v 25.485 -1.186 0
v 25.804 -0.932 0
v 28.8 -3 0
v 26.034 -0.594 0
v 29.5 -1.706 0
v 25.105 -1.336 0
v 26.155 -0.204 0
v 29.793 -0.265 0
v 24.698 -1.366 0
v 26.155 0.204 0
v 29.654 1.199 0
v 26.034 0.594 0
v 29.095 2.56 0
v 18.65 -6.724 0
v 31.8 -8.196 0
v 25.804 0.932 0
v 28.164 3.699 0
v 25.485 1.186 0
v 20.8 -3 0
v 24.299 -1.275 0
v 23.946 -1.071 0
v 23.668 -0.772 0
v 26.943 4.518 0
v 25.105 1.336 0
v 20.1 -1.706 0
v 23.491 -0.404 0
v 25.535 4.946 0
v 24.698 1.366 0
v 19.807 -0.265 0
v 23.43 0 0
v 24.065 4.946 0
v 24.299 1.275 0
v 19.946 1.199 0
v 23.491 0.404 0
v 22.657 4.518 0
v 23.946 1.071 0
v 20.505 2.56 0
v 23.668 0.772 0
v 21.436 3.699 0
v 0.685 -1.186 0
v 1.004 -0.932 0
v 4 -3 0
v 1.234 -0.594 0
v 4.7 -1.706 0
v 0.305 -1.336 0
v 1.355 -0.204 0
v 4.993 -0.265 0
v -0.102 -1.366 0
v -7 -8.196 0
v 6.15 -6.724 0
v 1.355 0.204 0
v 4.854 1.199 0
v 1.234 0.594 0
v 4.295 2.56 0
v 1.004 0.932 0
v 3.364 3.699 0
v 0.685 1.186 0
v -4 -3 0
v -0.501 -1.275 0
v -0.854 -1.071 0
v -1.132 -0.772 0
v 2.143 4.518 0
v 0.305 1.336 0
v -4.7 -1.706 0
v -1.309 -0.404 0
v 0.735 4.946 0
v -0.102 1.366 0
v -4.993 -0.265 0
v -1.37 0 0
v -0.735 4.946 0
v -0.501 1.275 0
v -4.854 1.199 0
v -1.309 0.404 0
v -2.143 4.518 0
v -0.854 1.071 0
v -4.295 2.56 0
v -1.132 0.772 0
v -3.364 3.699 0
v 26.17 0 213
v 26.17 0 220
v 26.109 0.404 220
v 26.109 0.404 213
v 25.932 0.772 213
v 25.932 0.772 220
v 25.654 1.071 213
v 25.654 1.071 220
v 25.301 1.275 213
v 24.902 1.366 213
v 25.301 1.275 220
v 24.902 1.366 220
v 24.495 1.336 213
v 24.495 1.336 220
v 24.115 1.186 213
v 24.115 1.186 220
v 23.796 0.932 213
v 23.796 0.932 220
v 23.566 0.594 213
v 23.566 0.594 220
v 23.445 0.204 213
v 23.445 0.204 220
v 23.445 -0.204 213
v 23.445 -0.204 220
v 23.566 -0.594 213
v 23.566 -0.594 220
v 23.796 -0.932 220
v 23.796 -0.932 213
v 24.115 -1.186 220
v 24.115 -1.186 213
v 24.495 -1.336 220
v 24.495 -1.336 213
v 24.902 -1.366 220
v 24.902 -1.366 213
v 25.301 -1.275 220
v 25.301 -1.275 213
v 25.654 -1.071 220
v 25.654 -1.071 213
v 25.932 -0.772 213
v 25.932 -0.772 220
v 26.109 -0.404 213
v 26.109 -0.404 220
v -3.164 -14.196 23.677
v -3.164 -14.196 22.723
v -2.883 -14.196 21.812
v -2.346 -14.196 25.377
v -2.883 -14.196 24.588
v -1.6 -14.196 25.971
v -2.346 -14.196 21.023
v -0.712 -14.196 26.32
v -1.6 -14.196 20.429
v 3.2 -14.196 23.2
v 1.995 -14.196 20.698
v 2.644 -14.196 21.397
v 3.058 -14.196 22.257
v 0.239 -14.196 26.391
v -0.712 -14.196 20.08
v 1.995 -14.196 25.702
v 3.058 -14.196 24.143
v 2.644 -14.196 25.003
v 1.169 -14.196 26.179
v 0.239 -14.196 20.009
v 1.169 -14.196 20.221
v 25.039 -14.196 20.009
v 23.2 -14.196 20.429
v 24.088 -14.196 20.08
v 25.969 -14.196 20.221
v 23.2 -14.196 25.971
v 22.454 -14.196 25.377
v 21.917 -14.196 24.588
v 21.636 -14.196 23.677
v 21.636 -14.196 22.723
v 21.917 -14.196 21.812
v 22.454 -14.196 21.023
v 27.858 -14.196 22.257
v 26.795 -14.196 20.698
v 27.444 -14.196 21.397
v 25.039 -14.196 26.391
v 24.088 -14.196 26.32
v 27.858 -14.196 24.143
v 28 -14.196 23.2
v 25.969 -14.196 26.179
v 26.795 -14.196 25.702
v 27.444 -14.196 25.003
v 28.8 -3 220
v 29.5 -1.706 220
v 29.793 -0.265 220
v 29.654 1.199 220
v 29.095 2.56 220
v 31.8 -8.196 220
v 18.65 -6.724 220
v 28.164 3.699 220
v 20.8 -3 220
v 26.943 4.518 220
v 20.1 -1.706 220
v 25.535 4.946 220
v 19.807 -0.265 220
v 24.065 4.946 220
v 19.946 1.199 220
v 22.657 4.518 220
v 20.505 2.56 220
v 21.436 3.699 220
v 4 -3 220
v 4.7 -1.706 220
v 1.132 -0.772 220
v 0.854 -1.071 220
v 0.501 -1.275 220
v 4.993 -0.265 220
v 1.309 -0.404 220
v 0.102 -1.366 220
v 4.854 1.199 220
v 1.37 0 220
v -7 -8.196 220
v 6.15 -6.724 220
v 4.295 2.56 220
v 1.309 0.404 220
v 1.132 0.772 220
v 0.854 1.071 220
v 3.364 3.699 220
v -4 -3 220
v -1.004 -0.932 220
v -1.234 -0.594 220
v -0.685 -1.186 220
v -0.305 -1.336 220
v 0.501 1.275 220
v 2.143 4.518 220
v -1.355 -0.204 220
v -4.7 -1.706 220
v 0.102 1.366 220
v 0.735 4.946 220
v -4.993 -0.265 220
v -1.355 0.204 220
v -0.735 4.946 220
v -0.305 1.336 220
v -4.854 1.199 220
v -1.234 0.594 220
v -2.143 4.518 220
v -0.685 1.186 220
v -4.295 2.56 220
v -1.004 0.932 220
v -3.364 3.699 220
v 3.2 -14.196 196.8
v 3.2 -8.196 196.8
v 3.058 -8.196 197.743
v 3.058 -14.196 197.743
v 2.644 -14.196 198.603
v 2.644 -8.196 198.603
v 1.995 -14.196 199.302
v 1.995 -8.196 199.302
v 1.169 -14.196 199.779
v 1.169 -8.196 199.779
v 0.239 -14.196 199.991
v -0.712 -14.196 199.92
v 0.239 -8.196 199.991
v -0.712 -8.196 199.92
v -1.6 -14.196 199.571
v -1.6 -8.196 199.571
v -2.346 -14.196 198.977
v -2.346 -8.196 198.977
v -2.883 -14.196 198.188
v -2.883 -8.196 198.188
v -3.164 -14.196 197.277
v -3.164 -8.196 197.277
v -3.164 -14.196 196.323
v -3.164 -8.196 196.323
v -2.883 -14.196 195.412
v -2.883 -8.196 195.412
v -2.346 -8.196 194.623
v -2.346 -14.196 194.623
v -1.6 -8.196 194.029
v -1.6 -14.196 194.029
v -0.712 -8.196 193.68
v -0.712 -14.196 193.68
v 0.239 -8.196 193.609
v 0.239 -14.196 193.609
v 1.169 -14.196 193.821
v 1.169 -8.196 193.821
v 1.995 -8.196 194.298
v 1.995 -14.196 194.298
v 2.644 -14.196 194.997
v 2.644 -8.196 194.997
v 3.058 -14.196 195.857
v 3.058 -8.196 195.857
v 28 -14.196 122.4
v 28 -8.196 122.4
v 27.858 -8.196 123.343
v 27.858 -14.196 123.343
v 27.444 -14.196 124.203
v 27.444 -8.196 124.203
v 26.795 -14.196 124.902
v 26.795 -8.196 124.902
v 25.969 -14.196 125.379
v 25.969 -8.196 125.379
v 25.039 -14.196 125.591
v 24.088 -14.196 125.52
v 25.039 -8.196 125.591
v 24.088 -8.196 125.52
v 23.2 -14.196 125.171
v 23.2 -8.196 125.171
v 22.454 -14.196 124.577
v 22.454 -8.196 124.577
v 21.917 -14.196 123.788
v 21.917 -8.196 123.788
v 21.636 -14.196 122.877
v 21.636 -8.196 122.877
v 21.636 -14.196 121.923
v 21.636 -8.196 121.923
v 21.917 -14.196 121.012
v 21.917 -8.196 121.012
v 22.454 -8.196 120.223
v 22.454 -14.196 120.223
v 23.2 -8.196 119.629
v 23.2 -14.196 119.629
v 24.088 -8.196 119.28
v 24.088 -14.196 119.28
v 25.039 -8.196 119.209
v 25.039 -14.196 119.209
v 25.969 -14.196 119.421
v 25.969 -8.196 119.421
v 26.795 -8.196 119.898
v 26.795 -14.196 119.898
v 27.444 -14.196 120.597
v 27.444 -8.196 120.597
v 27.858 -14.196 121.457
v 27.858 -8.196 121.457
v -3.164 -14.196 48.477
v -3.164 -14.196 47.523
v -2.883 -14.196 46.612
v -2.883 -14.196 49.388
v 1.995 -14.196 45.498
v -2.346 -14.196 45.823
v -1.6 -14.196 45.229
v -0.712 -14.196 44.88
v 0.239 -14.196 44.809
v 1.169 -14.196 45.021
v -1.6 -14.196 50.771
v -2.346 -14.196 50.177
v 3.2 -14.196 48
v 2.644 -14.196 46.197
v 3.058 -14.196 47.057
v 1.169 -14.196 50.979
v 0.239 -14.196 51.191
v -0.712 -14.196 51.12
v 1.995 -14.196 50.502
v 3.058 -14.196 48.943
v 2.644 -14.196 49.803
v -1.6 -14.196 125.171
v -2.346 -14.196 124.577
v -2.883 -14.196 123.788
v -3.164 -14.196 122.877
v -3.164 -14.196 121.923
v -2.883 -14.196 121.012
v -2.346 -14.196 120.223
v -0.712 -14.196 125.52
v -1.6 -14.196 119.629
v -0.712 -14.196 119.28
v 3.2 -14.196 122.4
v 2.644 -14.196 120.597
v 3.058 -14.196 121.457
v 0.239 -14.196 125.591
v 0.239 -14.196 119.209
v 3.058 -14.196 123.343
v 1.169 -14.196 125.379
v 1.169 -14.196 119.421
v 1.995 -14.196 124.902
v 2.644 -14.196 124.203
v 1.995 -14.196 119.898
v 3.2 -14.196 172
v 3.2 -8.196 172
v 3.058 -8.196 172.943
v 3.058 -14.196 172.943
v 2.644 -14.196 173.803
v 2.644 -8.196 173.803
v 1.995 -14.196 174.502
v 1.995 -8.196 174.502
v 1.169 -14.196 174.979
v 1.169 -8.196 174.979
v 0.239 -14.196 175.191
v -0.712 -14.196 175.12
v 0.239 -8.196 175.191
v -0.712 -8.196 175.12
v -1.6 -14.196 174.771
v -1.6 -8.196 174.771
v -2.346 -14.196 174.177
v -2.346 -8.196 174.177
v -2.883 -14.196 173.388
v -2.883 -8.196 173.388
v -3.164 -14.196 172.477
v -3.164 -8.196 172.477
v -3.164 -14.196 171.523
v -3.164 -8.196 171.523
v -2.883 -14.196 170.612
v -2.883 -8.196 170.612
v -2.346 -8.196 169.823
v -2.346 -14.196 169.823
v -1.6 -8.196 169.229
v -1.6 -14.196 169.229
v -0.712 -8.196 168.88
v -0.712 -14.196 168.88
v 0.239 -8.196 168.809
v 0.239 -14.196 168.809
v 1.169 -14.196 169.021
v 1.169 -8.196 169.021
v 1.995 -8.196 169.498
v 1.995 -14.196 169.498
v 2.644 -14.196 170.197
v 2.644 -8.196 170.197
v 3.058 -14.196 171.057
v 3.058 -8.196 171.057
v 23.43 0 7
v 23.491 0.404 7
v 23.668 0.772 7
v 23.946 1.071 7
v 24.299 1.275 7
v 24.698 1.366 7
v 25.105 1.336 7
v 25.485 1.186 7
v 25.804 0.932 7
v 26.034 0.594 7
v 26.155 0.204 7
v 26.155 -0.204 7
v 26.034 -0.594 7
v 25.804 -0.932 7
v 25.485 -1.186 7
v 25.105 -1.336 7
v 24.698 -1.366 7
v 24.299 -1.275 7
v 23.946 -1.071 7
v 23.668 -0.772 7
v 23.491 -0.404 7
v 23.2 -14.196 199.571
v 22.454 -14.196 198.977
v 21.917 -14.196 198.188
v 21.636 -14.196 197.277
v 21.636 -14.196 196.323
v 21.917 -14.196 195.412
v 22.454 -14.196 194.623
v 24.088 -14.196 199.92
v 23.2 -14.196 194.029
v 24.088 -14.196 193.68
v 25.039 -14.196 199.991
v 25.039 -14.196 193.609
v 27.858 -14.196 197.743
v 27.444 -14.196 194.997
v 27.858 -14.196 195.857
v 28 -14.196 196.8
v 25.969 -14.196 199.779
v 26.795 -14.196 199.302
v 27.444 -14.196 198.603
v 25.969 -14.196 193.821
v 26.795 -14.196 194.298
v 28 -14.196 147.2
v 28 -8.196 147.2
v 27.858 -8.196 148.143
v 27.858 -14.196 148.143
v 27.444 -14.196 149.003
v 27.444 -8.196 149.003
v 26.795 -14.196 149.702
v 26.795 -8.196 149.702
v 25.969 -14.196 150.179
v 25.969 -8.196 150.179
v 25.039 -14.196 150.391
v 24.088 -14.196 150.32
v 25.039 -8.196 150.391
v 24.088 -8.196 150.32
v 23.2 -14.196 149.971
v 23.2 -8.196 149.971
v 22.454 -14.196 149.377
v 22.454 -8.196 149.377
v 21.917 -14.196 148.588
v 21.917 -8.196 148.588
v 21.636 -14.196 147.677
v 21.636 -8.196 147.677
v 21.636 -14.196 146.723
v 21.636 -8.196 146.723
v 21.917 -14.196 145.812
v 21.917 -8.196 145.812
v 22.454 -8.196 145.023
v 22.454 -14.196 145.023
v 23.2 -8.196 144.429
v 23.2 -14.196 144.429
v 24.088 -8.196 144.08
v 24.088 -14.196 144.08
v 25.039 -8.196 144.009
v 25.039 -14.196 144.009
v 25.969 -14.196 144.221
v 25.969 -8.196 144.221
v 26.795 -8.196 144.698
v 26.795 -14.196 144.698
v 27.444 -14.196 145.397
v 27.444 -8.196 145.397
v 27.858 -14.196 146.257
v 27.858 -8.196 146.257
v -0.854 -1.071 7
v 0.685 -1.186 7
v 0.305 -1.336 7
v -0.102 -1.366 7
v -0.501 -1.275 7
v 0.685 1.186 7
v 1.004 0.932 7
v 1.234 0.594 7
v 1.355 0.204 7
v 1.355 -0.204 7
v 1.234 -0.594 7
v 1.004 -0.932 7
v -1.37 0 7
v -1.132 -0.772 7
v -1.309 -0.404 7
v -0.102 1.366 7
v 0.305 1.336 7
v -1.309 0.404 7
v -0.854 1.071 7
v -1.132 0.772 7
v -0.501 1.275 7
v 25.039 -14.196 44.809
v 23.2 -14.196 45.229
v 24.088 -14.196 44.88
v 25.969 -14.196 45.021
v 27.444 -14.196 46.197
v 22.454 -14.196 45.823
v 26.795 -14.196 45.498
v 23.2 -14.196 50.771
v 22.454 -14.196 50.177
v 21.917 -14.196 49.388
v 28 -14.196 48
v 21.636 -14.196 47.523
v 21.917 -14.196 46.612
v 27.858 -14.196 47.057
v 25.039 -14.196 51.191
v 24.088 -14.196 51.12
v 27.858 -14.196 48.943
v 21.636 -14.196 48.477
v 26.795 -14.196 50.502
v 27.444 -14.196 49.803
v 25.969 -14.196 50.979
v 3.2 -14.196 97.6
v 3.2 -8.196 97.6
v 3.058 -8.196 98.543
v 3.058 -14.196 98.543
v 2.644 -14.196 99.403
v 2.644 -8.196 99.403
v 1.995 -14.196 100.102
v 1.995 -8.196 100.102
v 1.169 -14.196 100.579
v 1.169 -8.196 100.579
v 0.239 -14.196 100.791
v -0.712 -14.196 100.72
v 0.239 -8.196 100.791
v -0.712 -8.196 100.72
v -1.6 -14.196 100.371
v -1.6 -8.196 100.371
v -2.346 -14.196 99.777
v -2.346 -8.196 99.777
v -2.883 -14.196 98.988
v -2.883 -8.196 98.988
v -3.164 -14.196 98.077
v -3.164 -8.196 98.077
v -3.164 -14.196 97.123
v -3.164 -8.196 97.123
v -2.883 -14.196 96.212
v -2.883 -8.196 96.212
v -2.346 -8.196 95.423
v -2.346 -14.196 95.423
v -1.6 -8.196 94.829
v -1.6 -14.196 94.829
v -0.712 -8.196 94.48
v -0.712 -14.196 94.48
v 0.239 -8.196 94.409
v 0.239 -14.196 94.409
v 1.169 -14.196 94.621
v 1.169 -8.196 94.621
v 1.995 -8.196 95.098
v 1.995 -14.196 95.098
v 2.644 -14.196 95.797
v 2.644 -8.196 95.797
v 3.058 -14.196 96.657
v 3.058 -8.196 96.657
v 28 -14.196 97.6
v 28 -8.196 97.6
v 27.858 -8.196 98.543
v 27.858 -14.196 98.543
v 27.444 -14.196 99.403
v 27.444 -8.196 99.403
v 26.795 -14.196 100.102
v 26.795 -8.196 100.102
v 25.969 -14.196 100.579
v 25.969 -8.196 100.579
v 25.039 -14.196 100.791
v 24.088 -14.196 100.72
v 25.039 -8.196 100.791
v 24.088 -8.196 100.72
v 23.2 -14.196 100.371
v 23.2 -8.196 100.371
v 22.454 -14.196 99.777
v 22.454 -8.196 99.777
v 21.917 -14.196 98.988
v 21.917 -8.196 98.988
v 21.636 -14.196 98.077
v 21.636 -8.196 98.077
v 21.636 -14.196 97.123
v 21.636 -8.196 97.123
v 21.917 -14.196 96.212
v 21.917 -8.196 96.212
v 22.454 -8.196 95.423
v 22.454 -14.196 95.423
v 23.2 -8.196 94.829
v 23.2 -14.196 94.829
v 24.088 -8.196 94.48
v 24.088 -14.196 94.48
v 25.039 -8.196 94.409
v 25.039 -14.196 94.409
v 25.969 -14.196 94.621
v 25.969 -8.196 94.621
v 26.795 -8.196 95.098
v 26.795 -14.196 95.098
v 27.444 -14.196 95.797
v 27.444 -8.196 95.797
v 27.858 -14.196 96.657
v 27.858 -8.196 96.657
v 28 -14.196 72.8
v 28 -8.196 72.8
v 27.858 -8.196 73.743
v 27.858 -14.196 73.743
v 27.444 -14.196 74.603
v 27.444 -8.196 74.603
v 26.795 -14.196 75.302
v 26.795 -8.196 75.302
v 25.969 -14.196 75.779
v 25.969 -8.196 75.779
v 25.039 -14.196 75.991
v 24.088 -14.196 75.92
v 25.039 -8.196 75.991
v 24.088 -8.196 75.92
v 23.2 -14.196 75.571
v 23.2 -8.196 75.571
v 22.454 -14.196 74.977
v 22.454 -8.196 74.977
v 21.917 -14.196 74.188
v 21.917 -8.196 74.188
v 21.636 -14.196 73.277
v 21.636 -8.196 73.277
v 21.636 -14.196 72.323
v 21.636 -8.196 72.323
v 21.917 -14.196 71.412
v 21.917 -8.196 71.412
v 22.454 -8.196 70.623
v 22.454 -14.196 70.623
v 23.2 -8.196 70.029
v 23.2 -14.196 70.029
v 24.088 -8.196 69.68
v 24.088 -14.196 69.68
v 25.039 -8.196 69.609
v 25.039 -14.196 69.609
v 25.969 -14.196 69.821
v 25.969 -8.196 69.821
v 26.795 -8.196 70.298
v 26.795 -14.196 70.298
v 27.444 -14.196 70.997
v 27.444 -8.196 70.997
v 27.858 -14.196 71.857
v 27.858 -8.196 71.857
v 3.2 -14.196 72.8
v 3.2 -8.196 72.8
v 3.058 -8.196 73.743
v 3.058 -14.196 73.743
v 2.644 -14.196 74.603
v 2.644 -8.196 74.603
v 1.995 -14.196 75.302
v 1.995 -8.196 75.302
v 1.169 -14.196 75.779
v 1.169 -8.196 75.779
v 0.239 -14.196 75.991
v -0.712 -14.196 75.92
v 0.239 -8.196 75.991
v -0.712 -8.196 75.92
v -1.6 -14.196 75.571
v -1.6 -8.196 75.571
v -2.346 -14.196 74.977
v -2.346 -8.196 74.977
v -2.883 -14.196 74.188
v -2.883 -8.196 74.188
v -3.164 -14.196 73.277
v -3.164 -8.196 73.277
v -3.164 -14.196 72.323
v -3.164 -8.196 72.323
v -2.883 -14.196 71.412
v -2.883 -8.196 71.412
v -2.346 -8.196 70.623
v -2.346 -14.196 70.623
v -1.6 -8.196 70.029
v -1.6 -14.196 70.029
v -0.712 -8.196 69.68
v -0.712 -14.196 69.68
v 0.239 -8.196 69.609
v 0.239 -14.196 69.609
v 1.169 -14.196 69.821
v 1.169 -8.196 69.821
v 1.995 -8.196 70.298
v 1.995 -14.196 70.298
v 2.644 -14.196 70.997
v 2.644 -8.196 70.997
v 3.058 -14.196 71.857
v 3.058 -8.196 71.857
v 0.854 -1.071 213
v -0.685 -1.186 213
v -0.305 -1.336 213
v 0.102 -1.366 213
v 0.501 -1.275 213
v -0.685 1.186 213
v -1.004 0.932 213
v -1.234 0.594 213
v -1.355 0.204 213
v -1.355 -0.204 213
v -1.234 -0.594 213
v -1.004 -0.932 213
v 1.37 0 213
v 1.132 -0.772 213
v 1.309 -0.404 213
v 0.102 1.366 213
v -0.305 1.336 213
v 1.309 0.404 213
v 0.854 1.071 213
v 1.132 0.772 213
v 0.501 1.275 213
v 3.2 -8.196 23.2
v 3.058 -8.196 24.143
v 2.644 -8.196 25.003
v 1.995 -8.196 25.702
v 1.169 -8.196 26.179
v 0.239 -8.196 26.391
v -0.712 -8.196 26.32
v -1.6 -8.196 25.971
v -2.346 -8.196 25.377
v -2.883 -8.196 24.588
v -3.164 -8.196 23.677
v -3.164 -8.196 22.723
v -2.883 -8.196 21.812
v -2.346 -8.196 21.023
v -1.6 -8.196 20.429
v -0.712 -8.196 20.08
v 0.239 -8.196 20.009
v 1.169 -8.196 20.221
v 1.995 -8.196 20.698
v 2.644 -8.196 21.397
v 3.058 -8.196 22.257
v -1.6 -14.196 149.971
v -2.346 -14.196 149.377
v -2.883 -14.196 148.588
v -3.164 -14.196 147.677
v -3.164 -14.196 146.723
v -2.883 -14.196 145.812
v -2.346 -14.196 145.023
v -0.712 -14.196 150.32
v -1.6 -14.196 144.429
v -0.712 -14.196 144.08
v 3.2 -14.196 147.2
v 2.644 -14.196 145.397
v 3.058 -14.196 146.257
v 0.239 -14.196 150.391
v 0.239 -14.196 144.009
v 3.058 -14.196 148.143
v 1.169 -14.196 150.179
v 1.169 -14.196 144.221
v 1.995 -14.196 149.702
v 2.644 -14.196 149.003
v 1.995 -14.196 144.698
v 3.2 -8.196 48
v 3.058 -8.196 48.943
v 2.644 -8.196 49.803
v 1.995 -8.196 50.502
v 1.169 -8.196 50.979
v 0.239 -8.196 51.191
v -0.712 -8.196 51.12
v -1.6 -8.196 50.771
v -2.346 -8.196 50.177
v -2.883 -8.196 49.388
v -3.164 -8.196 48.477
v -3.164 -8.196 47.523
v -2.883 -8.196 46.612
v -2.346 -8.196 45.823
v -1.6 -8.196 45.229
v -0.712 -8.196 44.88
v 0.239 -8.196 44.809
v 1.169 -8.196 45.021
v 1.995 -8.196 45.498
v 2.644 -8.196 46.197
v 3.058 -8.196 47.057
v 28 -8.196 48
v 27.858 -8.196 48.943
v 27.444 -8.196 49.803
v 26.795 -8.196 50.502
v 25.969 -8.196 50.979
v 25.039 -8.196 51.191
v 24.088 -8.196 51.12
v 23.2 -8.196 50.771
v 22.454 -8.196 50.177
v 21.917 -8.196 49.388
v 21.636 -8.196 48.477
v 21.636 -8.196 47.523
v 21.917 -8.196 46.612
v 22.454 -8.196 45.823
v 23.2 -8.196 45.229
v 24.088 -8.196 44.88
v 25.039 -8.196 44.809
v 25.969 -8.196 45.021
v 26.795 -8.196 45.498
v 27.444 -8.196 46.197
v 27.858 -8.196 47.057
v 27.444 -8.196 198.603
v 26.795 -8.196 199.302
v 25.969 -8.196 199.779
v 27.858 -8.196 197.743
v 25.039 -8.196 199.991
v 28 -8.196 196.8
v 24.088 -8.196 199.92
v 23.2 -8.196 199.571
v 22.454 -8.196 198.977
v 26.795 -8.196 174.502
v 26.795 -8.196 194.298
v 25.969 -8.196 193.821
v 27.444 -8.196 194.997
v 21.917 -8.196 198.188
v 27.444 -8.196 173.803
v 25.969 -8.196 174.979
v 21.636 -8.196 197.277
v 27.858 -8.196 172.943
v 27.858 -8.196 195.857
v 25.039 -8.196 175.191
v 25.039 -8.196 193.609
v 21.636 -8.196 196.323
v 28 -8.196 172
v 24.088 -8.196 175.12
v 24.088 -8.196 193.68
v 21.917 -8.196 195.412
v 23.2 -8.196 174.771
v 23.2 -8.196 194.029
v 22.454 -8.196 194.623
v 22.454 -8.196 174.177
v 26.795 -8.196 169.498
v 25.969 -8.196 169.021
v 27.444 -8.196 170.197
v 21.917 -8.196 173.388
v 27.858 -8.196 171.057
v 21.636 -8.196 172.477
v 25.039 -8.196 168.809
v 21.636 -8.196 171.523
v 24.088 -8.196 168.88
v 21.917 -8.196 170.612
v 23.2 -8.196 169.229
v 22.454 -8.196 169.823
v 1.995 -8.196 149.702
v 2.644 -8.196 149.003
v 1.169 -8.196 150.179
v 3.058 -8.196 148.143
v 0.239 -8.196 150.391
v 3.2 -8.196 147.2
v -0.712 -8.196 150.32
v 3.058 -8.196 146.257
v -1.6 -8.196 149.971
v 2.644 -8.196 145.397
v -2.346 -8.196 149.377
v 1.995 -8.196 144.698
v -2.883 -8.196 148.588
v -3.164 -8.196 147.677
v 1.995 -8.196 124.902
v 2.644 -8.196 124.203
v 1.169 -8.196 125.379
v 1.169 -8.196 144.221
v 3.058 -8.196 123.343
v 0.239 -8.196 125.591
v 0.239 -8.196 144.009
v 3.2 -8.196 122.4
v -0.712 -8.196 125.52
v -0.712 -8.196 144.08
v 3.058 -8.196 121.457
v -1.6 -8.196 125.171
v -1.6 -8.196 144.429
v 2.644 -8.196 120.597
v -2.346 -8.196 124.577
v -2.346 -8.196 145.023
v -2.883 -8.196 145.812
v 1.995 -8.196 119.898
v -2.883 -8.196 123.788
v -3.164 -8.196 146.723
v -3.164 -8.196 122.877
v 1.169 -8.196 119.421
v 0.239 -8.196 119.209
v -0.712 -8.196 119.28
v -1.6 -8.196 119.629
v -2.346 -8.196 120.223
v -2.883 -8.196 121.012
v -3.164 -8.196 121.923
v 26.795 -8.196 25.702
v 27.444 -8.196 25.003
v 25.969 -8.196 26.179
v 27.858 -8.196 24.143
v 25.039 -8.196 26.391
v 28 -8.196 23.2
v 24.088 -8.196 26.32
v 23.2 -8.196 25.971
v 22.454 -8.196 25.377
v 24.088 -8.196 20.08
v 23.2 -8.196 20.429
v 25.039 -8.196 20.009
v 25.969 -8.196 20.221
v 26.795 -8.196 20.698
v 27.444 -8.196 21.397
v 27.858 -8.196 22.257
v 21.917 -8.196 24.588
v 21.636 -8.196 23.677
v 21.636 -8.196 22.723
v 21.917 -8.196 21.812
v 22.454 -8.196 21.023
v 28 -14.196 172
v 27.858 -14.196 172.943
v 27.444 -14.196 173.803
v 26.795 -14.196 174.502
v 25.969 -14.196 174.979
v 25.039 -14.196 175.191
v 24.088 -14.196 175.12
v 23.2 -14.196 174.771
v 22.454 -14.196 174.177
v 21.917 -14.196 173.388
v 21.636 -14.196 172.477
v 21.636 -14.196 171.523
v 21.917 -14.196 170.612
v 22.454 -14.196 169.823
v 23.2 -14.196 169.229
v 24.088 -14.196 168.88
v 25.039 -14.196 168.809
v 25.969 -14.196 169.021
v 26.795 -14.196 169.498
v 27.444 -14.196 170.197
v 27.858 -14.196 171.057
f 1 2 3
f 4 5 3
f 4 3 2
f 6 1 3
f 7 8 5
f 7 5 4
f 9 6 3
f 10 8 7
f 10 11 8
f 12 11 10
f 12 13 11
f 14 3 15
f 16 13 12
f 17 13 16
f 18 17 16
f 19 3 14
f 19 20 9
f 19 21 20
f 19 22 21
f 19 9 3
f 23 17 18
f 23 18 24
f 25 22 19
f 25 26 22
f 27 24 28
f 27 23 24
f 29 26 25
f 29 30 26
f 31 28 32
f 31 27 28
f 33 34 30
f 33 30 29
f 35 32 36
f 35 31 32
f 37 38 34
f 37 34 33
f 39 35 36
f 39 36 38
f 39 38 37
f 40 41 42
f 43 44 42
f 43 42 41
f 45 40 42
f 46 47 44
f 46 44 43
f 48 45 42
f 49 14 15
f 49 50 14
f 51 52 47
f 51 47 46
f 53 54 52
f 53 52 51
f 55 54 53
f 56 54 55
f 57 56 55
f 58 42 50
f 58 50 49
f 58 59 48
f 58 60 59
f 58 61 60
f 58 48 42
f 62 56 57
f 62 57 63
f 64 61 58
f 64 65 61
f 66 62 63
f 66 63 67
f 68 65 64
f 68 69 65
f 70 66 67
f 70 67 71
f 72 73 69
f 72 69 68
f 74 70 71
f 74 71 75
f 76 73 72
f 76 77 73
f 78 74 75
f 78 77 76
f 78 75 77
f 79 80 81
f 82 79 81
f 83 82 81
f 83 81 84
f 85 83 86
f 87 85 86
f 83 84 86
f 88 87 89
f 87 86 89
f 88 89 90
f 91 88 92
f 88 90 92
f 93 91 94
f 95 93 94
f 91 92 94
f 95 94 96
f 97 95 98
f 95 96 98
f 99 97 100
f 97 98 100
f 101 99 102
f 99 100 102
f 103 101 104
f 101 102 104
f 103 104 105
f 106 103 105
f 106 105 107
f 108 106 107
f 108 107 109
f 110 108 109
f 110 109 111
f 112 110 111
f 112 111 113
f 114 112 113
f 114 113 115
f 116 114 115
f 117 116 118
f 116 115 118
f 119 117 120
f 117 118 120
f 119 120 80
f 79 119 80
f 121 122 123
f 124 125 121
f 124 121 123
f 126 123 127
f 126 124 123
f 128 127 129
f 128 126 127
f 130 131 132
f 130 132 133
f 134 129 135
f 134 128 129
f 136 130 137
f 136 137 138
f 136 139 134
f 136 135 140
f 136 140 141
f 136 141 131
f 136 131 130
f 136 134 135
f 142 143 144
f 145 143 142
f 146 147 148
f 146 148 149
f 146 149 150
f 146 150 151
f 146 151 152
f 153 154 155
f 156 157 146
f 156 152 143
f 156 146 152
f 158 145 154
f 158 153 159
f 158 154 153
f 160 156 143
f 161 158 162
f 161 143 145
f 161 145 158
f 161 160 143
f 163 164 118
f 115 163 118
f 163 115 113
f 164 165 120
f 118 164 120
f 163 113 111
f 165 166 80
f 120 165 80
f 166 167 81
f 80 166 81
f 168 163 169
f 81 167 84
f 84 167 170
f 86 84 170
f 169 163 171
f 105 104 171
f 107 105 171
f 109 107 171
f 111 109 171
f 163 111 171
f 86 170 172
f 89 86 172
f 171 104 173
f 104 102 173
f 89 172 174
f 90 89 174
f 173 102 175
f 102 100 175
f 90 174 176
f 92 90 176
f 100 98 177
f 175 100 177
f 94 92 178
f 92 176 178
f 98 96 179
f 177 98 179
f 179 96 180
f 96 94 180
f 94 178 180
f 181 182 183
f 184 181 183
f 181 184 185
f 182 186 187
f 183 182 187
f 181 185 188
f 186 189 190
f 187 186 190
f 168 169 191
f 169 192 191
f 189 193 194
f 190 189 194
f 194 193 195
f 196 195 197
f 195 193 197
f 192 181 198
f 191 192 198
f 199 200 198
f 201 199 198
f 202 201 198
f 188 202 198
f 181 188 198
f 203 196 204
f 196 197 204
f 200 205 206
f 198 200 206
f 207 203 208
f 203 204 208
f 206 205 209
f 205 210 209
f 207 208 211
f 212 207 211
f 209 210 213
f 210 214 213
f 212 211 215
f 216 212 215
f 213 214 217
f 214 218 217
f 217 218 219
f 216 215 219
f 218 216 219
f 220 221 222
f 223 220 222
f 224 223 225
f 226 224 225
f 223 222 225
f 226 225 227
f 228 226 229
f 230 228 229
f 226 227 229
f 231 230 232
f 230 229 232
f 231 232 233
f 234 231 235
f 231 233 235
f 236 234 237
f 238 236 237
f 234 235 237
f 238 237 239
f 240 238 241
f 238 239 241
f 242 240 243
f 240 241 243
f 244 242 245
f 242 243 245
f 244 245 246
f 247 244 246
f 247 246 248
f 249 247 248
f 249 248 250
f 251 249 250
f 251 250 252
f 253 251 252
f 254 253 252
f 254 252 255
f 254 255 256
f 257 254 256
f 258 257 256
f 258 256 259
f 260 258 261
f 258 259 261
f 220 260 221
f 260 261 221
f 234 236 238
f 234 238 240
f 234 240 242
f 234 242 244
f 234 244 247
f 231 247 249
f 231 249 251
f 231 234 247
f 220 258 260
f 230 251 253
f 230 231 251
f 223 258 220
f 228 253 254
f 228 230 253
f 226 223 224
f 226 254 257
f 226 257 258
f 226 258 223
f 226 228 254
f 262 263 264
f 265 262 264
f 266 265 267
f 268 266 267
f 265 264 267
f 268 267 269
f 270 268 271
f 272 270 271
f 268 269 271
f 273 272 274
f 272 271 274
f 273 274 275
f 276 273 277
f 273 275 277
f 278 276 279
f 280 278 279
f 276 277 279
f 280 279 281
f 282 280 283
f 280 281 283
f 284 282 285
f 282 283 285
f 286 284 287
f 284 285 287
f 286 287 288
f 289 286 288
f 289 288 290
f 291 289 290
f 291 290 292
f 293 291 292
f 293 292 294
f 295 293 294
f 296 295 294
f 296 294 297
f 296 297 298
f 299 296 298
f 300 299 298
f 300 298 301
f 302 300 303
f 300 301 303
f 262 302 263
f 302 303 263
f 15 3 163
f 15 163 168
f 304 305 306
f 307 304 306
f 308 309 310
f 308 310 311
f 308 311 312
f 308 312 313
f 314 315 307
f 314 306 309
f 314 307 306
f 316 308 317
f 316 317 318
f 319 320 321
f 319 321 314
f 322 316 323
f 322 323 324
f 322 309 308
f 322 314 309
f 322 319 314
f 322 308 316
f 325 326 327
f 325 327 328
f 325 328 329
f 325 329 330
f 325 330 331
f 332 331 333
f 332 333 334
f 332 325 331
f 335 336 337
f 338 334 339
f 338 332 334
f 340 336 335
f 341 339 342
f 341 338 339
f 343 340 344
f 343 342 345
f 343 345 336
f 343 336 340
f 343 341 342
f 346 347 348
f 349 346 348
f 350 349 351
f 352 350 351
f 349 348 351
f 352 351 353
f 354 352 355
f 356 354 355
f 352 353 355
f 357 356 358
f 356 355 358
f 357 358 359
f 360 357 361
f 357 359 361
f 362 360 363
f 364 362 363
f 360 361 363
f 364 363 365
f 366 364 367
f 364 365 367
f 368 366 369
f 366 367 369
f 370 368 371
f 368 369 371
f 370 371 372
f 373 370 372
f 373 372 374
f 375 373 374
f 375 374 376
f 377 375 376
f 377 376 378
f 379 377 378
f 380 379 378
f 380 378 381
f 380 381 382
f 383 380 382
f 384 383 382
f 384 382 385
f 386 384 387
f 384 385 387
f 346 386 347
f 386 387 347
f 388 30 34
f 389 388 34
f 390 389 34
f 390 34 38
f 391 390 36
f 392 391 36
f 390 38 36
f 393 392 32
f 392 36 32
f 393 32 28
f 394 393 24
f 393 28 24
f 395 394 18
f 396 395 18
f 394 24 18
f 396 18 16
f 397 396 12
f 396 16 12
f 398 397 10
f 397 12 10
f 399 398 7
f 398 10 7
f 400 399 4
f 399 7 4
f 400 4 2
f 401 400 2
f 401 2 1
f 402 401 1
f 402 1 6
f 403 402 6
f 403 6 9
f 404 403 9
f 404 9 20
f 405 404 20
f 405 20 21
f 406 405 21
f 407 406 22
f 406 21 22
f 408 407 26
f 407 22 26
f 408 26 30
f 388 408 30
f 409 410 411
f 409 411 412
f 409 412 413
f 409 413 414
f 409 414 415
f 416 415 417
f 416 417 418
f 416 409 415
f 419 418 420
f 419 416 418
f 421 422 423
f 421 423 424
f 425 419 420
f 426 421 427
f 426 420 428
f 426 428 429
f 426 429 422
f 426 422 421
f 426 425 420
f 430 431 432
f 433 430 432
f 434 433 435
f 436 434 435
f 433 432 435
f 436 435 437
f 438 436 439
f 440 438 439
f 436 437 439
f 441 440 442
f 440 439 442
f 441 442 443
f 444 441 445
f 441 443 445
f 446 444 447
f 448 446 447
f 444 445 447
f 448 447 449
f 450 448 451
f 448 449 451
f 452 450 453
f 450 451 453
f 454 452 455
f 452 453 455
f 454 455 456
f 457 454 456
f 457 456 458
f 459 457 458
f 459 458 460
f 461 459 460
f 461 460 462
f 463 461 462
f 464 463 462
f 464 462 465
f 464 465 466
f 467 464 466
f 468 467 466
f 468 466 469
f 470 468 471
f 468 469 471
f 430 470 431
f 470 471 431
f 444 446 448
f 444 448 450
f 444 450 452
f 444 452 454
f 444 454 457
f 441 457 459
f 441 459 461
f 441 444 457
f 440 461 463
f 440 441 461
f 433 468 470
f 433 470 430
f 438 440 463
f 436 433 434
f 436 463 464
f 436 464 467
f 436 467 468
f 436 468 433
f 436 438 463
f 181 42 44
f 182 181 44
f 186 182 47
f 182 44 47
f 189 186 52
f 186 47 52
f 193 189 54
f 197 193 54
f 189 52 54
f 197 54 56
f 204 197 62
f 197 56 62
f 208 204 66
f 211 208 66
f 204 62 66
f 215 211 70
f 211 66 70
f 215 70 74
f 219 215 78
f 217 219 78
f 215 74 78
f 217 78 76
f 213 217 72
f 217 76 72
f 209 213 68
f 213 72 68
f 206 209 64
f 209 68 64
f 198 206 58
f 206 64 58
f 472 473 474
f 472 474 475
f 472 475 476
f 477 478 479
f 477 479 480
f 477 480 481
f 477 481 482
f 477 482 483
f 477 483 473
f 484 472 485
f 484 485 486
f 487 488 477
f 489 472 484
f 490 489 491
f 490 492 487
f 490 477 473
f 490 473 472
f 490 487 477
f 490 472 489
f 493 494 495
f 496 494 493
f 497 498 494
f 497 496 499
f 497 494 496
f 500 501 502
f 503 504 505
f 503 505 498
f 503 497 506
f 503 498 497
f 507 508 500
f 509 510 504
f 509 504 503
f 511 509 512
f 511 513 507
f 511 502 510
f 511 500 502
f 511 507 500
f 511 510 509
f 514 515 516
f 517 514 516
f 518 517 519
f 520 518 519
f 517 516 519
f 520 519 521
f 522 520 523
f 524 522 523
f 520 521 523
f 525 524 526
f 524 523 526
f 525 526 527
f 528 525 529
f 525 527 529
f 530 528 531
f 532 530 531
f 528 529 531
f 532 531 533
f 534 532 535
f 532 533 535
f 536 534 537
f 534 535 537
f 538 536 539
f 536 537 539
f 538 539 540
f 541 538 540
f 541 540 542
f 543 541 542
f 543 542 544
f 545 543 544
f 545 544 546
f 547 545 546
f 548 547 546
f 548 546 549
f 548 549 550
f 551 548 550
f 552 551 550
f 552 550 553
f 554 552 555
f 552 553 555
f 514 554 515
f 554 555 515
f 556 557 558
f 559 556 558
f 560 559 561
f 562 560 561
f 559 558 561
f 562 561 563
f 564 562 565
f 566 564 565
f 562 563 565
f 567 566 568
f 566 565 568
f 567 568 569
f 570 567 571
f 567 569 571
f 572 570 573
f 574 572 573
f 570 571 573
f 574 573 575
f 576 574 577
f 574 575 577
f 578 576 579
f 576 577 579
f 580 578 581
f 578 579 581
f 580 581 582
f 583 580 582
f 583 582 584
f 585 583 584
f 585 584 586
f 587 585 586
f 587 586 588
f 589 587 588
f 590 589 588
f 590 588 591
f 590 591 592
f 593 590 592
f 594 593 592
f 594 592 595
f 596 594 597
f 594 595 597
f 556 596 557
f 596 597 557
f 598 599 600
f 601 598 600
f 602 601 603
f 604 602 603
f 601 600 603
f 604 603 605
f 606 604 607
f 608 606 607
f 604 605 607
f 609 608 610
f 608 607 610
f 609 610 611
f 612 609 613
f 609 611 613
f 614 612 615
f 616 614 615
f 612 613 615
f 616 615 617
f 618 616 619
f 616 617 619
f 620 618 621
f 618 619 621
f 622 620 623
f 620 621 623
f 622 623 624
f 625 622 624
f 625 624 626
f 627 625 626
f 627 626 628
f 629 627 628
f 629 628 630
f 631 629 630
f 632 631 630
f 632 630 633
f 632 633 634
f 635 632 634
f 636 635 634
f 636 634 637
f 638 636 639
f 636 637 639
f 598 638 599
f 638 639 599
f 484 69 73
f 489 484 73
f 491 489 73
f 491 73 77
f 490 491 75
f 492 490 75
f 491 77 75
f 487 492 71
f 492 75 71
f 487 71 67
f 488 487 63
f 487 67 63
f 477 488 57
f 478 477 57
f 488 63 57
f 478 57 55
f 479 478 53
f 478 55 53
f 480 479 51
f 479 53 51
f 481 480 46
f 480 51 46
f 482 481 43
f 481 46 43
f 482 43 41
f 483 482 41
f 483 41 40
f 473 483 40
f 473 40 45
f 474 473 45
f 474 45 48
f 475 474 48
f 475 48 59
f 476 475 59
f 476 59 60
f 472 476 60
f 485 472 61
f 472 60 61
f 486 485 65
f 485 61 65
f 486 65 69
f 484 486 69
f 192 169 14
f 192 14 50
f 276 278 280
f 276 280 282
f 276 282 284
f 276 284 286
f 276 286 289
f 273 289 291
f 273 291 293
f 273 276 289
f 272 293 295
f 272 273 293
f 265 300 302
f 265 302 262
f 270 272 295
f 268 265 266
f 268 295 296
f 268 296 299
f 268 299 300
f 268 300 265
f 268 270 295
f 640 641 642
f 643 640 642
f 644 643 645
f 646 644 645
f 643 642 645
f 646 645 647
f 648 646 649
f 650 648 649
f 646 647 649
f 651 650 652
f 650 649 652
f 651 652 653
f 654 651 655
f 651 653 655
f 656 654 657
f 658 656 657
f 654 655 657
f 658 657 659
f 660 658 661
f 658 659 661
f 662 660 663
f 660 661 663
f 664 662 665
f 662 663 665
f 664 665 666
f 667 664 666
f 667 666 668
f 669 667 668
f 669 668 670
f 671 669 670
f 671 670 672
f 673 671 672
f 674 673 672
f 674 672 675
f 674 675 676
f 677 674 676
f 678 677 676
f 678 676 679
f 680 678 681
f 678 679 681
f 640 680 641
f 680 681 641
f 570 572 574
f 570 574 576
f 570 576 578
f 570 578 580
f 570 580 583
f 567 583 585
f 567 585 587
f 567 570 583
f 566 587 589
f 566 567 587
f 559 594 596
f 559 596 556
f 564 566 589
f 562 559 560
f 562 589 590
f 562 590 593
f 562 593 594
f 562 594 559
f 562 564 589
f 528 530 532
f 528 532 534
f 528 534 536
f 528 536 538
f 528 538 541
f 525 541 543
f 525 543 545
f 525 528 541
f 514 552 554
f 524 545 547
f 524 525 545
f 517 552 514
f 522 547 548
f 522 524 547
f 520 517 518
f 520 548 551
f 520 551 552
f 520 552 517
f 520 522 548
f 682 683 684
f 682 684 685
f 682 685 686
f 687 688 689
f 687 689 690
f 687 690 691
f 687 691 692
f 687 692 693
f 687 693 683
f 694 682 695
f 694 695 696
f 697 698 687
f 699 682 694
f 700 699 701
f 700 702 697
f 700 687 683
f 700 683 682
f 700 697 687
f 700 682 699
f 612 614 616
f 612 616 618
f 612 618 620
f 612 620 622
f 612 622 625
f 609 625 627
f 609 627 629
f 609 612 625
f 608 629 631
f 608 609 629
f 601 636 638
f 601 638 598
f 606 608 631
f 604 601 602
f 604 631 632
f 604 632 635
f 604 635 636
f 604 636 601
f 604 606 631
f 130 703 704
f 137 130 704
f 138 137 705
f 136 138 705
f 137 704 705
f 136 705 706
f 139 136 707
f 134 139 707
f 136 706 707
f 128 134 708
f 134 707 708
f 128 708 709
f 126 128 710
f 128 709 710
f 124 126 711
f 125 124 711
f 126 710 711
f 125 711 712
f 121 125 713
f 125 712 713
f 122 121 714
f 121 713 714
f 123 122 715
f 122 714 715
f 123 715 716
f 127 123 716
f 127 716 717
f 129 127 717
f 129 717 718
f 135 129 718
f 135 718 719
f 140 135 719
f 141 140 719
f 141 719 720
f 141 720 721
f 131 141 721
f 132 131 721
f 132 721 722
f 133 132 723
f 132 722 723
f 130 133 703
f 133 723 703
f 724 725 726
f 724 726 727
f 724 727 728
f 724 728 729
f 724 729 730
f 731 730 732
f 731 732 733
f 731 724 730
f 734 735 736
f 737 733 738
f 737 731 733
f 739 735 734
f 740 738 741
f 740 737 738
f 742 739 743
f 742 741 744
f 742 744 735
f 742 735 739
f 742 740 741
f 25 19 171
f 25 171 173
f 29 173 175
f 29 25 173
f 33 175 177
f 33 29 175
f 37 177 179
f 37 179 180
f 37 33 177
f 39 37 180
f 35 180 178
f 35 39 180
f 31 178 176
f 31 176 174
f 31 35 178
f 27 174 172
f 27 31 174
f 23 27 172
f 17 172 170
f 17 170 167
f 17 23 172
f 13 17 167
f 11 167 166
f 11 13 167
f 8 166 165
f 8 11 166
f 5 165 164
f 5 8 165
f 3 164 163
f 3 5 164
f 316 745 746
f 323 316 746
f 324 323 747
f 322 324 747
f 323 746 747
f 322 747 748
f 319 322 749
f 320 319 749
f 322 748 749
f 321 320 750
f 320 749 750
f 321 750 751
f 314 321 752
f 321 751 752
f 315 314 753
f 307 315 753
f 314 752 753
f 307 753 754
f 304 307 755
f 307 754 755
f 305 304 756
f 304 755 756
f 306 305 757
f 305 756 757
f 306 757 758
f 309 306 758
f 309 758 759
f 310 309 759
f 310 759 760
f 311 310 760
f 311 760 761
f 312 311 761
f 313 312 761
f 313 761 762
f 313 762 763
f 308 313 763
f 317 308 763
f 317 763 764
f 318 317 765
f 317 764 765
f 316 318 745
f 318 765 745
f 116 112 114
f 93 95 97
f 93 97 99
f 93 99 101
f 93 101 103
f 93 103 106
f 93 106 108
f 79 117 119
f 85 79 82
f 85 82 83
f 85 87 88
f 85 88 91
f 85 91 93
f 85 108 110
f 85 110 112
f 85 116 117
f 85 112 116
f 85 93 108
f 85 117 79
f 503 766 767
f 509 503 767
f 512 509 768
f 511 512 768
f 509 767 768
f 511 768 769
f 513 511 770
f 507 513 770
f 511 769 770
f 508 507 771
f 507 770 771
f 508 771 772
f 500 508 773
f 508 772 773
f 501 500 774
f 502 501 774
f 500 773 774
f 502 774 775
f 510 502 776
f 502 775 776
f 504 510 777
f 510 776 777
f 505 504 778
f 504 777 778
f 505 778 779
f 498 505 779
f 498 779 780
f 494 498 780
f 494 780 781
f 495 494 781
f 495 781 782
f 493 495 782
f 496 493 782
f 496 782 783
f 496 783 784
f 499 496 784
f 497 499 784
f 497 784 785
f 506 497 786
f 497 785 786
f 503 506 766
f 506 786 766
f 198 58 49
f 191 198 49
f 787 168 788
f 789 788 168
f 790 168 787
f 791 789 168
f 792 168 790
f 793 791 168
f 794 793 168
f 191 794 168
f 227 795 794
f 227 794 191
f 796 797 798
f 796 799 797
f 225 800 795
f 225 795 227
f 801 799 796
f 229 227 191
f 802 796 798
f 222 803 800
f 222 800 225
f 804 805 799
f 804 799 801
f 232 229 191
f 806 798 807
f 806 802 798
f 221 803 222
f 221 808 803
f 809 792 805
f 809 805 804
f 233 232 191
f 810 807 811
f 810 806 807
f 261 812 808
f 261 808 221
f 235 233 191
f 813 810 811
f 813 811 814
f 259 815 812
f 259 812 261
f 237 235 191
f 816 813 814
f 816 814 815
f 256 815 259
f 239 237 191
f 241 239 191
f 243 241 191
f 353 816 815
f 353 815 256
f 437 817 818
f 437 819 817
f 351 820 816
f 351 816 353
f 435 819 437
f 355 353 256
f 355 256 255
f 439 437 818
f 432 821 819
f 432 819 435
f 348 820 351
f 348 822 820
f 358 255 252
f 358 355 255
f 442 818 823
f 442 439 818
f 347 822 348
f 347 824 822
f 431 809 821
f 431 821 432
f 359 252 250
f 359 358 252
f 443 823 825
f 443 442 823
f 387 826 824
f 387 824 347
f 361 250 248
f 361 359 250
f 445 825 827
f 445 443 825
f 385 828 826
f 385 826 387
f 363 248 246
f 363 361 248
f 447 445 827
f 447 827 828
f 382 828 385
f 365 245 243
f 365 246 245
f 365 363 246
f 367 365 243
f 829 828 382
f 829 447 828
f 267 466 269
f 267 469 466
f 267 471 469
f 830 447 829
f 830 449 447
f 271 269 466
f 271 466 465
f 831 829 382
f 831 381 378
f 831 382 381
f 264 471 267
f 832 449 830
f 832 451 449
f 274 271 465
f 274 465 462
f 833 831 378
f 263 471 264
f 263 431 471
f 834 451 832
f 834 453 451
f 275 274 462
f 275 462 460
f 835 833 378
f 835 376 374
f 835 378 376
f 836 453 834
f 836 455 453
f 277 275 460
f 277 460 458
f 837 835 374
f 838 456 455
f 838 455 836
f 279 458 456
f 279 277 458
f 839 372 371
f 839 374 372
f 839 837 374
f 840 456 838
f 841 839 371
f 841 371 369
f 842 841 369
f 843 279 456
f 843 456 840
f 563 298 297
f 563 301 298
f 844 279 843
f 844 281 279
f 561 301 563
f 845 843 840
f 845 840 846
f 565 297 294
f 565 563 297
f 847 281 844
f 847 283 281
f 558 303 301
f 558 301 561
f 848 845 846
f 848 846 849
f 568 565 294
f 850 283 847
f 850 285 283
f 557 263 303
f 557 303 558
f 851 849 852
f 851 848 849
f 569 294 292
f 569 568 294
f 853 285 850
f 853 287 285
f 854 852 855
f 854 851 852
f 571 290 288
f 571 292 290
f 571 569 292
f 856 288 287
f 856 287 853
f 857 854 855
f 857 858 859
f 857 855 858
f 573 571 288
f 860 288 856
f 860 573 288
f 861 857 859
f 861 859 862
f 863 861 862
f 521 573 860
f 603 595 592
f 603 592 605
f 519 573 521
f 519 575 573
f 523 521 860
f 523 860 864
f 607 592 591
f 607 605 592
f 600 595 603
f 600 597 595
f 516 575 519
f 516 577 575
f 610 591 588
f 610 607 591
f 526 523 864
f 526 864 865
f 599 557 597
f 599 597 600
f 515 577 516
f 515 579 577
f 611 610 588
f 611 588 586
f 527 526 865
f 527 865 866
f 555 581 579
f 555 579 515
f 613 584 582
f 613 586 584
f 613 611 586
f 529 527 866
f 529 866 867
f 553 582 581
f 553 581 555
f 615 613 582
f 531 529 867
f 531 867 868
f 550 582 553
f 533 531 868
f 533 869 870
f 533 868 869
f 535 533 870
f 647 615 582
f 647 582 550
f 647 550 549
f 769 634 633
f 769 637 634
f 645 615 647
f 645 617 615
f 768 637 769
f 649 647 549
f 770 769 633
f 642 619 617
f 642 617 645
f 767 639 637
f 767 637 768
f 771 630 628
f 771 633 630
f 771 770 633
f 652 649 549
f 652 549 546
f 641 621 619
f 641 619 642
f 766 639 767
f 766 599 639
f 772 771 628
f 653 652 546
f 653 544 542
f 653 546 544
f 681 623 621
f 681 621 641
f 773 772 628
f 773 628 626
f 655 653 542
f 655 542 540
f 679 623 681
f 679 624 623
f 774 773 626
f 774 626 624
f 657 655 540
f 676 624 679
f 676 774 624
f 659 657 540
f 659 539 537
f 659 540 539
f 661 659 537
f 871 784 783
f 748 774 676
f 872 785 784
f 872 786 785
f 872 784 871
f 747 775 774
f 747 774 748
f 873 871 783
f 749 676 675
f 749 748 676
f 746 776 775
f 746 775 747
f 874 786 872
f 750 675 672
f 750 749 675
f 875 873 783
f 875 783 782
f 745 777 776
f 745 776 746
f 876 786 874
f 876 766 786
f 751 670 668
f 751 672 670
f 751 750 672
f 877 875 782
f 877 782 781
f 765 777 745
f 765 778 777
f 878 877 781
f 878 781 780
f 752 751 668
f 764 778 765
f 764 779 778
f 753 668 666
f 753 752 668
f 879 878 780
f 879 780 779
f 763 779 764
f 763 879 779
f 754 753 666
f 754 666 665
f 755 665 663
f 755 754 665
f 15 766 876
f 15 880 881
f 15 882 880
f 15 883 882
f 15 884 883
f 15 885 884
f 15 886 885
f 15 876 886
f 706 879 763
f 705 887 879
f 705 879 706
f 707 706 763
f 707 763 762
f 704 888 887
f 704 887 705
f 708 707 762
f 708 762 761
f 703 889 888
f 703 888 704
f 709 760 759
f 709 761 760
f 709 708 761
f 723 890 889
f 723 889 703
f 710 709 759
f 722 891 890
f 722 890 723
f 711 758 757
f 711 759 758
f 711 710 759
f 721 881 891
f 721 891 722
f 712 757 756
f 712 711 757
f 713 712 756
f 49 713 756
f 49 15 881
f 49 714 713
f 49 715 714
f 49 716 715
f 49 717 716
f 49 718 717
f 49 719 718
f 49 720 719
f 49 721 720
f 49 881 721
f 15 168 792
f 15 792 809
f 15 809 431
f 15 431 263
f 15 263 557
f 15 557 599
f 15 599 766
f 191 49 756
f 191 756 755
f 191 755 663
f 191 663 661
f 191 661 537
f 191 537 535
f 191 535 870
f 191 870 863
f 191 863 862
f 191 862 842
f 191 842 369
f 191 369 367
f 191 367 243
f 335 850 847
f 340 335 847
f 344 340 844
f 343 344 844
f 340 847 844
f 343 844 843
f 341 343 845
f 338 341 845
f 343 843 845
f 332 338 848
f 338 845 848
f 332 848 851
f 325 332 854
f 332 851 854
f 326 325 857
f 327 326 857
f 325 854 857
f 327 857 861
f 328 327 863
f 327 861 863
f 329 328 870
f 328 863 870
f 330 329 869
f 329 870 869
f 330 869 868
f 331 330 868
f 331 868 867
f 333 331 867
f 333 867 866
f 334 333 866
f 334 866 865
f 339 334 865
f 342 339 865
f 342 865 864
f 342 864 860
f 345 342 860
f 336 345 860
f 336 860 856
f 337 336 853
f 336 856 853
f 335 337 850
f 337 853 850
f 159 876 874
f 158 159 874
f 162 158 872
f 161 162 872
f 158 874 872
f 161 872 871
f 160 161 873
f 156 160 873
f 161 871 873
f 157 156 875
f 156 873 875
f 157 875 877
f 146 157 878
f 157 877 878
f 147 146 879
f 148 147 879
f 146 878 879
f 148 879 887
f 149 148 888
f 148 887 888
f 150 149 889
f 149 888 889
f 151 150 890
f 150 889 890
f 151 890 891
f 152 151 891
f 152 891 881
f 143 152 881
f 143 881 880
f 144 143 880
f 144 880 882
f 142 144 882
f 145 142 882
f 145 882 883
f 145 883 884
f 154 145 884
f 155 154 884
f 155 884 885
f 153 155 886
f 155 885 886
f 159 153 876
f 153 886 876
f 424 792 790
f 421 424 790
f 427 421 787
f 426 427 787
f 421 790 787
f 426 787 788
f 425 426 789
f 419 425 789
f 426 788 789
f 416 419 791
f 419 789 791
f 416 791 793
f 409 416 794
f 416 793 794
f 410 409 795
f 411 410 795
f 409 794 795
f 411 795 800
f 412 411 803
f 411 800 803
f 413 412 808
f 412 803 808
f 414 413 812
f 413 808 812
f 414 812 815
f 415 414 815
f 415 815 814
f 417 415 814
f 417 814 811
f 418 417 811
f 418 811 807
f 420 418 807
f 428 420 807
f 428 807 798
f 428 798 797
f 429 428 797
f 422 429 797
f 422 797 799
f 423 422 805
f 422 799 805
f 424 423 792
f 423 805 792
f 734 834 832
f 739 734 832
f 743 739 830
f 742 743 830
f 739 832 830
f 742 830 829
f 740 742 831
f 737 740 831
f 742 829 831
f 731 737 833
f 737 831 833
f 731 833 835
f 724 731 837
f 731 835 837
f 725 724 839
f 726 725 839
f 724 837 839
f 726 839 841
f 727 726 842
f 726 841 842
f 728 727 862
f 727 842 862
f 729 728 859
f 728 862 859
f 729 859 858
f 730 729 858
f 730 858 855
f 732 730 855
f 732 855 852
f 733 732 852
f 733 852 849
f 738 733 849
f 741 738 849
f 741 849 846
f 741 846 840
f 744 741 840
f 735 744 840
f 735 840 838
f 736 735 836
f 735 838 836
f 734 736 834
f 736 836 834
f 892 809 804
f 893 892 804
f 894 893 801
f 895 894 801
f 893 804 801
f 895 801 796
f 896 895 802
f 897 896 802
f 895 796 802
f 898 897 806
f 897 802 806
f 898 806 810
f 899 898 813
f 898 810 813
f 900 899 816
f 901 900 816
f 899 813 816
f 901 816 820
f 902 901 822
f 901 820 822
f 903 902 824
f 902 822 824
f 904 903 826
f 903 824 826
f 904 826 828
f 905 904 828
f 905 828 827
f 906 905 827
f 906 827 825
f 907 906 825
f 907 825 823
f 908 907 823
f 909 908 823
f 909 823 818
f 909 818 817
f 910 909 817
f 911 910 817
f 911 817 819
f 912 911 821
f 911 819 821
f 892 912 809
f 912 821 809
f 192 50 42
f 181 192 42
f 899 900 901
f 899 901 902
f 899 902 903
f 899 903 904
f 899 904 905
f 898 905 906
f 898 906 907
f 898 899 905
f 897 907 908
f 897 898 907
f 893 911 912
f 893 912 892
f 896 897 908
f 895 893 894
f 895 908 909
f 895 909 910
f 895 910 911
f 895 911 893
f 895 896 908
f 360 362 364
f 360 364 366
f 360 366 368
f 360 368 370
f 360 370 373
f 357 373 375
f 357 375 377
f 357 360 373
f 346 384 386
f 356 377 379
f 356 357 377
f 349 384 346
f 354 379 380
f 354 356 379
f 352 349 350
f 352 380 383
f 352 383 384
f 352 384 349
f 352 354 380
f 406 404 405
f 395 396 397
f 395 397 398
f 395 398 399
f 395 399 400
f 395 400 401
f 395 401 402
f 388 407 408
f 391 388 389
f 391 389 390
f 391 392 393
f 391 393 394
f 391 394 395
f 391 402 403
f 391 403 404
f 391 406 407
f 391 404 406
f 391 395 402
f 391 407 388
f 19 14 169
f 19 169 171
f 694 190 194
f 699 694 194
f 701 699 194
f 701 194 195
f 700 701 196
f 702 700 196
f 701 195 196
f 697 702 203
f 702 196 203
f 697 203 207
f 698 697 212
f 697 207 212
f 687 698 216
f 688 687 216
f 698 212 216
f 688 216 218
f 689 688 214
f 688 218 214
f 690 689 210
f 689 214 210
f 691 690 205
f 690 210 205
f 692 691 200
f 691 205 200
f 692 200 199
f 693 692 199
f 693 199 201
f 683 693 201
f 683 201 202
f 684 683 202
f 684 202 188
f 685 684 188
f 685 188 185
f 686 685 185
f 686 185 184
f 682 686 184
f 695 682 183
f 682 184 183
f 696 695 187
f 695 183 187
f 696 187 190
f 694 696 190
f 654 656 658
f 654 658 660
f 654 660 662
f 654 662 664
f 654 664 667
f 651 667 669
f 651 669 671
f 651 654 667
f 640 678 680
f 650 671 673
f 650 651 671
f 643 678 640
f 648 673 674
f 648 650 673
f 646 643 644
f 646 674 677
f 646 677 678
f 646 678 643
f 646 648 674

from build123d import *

# Parameters (mm, degrees)
SKETCH1_R           = 5
BOSS_EXTRUDE1_DEPTH = 220
SKETCH4_R           = 3.2
BOSS_EXTRUDE3_DEPTH = 6
BOSS_EXTRUDE4_DEPTH = 220
SKETCH5_R           = 1.37
CUT_EXTRUDE1_DEPTH  = 7
SKETCH6_R           = 1.37
CUT_EXTRUDE2_DEPTH  = 7


with BuildPart() as part:
    # Sketch1 → Boss-Extrude1 (new body)
    with BuildSketch(Plane.XY):
        Circle(SKETCH1_R)
        with BuildLine():
            Line((-4, -3), (-7, -8.196152423))
            Line((-7, -8.196152423), (7, -8.196152423))
            Line((7, -8.196152423), (4, -3))
            ThreePointArc((4, -3), (0, 5), (-4, -3))
        make_face()
        with BuildLine():
            Line((28.8, -3), (31.8, -8.196152423))
            Line((31.8, -8.196152423), (17.8, -8.196152423))
            Line((17.8, -8.196152423), (20.8, -3))
            ThreePointArc((20.8, -3), (24.8, 5), (28.8, -3))
        make_face()
    extrude(amount=BOSS_EXTRUDE1_DEPTH)

    # Sketch4 → Boss-Extrude3 (add)
    with BuildSketch(Plane.XZ.offset(8.196152423)):
        with Locations((0, 196.8)):
            Circle(SKETCH4_R)
        with Locations((24.8, 196.8)):
            Circle(SKETCH4_R)
        with Locations((24.8, 172)):
            Circle(SKETCH4_R)
        with Locations((24.8, 147.2)):
            Circle(SKETCH4_R)
        with Locations((24.8, 122.4)):
            Circle(SKETCH4_R)
        with Locations((24.8, 97.6)):
            Circle(SKETCH4_R)
        with Locations((24.8, 72.8)):
            Circle(SKETCH4_R)
        with Locations((24.8, 48)):
            Circle(SKETCH4_R)
        with Locations((24.8, 23.2)):
            Circle(SKETCH4_R)
        with Locations((0, 172)):
            Circle(SKETCH4_R)
        with Locations((0, 147.2)):
            Circle(SKETCH4_R)
        with Locations((0, 122.4)):
            Circle(SKETCH4_R)
        with Locations((0, 97.6)):
            Circle(SKETCH4_R)
        with Locations((0, 72.8)):
            Circle(SKETCH4_R)
        with Locations((0, 48)):
            Circle(SKETCH4_R)
        with Locations((0, 23.2)):
            Circle(SKETCH4_R)
    extrude(amount=BOSS_EXTRUDE3_DEPTH)

    # Sketch3 → Boss-Extrude4 (add)
    with BuildSketch(Plane.XY.offset(220)):
        Polygon((7, -8.196152423), (17.8, -8.196152423), (18.65, -8.196152423), (18.65, -6.723909236), (6.15, -6.723909236), (6.15, -8.196152423), align=None)
    extrude(amount=-BOSS_EXTRUDE4_DEPTH)

    # Sketch5 → Cut-Extrude1 (cut)
    with BuildSketch(Plane(origin=(0, 0, 0), x_dir=(-1, 0, 0), z_dir=(0, 0, -1))):
        Circle(SKETCH5_R)
        with Locations((-24.8, 0)):
            Circle(SKETCH5_R)
    extrude(amount=-CUT_EXTRUDE1_DEPTH, mode=Mode.SUBTRACT)

    # Sketch6 → Cut-Extrude2 (cut)
    with BuildSketch(Plane.XY.offset(220)):
        Circle(SKETCH6_R)
        with Locations((24.8, 0)):
            Circle(SKETCH6_R)
    extrude(amount=-CUT_EXTRUDE2_DEPTH, mode=Mode.SUBTRACT)


solid = part.part
